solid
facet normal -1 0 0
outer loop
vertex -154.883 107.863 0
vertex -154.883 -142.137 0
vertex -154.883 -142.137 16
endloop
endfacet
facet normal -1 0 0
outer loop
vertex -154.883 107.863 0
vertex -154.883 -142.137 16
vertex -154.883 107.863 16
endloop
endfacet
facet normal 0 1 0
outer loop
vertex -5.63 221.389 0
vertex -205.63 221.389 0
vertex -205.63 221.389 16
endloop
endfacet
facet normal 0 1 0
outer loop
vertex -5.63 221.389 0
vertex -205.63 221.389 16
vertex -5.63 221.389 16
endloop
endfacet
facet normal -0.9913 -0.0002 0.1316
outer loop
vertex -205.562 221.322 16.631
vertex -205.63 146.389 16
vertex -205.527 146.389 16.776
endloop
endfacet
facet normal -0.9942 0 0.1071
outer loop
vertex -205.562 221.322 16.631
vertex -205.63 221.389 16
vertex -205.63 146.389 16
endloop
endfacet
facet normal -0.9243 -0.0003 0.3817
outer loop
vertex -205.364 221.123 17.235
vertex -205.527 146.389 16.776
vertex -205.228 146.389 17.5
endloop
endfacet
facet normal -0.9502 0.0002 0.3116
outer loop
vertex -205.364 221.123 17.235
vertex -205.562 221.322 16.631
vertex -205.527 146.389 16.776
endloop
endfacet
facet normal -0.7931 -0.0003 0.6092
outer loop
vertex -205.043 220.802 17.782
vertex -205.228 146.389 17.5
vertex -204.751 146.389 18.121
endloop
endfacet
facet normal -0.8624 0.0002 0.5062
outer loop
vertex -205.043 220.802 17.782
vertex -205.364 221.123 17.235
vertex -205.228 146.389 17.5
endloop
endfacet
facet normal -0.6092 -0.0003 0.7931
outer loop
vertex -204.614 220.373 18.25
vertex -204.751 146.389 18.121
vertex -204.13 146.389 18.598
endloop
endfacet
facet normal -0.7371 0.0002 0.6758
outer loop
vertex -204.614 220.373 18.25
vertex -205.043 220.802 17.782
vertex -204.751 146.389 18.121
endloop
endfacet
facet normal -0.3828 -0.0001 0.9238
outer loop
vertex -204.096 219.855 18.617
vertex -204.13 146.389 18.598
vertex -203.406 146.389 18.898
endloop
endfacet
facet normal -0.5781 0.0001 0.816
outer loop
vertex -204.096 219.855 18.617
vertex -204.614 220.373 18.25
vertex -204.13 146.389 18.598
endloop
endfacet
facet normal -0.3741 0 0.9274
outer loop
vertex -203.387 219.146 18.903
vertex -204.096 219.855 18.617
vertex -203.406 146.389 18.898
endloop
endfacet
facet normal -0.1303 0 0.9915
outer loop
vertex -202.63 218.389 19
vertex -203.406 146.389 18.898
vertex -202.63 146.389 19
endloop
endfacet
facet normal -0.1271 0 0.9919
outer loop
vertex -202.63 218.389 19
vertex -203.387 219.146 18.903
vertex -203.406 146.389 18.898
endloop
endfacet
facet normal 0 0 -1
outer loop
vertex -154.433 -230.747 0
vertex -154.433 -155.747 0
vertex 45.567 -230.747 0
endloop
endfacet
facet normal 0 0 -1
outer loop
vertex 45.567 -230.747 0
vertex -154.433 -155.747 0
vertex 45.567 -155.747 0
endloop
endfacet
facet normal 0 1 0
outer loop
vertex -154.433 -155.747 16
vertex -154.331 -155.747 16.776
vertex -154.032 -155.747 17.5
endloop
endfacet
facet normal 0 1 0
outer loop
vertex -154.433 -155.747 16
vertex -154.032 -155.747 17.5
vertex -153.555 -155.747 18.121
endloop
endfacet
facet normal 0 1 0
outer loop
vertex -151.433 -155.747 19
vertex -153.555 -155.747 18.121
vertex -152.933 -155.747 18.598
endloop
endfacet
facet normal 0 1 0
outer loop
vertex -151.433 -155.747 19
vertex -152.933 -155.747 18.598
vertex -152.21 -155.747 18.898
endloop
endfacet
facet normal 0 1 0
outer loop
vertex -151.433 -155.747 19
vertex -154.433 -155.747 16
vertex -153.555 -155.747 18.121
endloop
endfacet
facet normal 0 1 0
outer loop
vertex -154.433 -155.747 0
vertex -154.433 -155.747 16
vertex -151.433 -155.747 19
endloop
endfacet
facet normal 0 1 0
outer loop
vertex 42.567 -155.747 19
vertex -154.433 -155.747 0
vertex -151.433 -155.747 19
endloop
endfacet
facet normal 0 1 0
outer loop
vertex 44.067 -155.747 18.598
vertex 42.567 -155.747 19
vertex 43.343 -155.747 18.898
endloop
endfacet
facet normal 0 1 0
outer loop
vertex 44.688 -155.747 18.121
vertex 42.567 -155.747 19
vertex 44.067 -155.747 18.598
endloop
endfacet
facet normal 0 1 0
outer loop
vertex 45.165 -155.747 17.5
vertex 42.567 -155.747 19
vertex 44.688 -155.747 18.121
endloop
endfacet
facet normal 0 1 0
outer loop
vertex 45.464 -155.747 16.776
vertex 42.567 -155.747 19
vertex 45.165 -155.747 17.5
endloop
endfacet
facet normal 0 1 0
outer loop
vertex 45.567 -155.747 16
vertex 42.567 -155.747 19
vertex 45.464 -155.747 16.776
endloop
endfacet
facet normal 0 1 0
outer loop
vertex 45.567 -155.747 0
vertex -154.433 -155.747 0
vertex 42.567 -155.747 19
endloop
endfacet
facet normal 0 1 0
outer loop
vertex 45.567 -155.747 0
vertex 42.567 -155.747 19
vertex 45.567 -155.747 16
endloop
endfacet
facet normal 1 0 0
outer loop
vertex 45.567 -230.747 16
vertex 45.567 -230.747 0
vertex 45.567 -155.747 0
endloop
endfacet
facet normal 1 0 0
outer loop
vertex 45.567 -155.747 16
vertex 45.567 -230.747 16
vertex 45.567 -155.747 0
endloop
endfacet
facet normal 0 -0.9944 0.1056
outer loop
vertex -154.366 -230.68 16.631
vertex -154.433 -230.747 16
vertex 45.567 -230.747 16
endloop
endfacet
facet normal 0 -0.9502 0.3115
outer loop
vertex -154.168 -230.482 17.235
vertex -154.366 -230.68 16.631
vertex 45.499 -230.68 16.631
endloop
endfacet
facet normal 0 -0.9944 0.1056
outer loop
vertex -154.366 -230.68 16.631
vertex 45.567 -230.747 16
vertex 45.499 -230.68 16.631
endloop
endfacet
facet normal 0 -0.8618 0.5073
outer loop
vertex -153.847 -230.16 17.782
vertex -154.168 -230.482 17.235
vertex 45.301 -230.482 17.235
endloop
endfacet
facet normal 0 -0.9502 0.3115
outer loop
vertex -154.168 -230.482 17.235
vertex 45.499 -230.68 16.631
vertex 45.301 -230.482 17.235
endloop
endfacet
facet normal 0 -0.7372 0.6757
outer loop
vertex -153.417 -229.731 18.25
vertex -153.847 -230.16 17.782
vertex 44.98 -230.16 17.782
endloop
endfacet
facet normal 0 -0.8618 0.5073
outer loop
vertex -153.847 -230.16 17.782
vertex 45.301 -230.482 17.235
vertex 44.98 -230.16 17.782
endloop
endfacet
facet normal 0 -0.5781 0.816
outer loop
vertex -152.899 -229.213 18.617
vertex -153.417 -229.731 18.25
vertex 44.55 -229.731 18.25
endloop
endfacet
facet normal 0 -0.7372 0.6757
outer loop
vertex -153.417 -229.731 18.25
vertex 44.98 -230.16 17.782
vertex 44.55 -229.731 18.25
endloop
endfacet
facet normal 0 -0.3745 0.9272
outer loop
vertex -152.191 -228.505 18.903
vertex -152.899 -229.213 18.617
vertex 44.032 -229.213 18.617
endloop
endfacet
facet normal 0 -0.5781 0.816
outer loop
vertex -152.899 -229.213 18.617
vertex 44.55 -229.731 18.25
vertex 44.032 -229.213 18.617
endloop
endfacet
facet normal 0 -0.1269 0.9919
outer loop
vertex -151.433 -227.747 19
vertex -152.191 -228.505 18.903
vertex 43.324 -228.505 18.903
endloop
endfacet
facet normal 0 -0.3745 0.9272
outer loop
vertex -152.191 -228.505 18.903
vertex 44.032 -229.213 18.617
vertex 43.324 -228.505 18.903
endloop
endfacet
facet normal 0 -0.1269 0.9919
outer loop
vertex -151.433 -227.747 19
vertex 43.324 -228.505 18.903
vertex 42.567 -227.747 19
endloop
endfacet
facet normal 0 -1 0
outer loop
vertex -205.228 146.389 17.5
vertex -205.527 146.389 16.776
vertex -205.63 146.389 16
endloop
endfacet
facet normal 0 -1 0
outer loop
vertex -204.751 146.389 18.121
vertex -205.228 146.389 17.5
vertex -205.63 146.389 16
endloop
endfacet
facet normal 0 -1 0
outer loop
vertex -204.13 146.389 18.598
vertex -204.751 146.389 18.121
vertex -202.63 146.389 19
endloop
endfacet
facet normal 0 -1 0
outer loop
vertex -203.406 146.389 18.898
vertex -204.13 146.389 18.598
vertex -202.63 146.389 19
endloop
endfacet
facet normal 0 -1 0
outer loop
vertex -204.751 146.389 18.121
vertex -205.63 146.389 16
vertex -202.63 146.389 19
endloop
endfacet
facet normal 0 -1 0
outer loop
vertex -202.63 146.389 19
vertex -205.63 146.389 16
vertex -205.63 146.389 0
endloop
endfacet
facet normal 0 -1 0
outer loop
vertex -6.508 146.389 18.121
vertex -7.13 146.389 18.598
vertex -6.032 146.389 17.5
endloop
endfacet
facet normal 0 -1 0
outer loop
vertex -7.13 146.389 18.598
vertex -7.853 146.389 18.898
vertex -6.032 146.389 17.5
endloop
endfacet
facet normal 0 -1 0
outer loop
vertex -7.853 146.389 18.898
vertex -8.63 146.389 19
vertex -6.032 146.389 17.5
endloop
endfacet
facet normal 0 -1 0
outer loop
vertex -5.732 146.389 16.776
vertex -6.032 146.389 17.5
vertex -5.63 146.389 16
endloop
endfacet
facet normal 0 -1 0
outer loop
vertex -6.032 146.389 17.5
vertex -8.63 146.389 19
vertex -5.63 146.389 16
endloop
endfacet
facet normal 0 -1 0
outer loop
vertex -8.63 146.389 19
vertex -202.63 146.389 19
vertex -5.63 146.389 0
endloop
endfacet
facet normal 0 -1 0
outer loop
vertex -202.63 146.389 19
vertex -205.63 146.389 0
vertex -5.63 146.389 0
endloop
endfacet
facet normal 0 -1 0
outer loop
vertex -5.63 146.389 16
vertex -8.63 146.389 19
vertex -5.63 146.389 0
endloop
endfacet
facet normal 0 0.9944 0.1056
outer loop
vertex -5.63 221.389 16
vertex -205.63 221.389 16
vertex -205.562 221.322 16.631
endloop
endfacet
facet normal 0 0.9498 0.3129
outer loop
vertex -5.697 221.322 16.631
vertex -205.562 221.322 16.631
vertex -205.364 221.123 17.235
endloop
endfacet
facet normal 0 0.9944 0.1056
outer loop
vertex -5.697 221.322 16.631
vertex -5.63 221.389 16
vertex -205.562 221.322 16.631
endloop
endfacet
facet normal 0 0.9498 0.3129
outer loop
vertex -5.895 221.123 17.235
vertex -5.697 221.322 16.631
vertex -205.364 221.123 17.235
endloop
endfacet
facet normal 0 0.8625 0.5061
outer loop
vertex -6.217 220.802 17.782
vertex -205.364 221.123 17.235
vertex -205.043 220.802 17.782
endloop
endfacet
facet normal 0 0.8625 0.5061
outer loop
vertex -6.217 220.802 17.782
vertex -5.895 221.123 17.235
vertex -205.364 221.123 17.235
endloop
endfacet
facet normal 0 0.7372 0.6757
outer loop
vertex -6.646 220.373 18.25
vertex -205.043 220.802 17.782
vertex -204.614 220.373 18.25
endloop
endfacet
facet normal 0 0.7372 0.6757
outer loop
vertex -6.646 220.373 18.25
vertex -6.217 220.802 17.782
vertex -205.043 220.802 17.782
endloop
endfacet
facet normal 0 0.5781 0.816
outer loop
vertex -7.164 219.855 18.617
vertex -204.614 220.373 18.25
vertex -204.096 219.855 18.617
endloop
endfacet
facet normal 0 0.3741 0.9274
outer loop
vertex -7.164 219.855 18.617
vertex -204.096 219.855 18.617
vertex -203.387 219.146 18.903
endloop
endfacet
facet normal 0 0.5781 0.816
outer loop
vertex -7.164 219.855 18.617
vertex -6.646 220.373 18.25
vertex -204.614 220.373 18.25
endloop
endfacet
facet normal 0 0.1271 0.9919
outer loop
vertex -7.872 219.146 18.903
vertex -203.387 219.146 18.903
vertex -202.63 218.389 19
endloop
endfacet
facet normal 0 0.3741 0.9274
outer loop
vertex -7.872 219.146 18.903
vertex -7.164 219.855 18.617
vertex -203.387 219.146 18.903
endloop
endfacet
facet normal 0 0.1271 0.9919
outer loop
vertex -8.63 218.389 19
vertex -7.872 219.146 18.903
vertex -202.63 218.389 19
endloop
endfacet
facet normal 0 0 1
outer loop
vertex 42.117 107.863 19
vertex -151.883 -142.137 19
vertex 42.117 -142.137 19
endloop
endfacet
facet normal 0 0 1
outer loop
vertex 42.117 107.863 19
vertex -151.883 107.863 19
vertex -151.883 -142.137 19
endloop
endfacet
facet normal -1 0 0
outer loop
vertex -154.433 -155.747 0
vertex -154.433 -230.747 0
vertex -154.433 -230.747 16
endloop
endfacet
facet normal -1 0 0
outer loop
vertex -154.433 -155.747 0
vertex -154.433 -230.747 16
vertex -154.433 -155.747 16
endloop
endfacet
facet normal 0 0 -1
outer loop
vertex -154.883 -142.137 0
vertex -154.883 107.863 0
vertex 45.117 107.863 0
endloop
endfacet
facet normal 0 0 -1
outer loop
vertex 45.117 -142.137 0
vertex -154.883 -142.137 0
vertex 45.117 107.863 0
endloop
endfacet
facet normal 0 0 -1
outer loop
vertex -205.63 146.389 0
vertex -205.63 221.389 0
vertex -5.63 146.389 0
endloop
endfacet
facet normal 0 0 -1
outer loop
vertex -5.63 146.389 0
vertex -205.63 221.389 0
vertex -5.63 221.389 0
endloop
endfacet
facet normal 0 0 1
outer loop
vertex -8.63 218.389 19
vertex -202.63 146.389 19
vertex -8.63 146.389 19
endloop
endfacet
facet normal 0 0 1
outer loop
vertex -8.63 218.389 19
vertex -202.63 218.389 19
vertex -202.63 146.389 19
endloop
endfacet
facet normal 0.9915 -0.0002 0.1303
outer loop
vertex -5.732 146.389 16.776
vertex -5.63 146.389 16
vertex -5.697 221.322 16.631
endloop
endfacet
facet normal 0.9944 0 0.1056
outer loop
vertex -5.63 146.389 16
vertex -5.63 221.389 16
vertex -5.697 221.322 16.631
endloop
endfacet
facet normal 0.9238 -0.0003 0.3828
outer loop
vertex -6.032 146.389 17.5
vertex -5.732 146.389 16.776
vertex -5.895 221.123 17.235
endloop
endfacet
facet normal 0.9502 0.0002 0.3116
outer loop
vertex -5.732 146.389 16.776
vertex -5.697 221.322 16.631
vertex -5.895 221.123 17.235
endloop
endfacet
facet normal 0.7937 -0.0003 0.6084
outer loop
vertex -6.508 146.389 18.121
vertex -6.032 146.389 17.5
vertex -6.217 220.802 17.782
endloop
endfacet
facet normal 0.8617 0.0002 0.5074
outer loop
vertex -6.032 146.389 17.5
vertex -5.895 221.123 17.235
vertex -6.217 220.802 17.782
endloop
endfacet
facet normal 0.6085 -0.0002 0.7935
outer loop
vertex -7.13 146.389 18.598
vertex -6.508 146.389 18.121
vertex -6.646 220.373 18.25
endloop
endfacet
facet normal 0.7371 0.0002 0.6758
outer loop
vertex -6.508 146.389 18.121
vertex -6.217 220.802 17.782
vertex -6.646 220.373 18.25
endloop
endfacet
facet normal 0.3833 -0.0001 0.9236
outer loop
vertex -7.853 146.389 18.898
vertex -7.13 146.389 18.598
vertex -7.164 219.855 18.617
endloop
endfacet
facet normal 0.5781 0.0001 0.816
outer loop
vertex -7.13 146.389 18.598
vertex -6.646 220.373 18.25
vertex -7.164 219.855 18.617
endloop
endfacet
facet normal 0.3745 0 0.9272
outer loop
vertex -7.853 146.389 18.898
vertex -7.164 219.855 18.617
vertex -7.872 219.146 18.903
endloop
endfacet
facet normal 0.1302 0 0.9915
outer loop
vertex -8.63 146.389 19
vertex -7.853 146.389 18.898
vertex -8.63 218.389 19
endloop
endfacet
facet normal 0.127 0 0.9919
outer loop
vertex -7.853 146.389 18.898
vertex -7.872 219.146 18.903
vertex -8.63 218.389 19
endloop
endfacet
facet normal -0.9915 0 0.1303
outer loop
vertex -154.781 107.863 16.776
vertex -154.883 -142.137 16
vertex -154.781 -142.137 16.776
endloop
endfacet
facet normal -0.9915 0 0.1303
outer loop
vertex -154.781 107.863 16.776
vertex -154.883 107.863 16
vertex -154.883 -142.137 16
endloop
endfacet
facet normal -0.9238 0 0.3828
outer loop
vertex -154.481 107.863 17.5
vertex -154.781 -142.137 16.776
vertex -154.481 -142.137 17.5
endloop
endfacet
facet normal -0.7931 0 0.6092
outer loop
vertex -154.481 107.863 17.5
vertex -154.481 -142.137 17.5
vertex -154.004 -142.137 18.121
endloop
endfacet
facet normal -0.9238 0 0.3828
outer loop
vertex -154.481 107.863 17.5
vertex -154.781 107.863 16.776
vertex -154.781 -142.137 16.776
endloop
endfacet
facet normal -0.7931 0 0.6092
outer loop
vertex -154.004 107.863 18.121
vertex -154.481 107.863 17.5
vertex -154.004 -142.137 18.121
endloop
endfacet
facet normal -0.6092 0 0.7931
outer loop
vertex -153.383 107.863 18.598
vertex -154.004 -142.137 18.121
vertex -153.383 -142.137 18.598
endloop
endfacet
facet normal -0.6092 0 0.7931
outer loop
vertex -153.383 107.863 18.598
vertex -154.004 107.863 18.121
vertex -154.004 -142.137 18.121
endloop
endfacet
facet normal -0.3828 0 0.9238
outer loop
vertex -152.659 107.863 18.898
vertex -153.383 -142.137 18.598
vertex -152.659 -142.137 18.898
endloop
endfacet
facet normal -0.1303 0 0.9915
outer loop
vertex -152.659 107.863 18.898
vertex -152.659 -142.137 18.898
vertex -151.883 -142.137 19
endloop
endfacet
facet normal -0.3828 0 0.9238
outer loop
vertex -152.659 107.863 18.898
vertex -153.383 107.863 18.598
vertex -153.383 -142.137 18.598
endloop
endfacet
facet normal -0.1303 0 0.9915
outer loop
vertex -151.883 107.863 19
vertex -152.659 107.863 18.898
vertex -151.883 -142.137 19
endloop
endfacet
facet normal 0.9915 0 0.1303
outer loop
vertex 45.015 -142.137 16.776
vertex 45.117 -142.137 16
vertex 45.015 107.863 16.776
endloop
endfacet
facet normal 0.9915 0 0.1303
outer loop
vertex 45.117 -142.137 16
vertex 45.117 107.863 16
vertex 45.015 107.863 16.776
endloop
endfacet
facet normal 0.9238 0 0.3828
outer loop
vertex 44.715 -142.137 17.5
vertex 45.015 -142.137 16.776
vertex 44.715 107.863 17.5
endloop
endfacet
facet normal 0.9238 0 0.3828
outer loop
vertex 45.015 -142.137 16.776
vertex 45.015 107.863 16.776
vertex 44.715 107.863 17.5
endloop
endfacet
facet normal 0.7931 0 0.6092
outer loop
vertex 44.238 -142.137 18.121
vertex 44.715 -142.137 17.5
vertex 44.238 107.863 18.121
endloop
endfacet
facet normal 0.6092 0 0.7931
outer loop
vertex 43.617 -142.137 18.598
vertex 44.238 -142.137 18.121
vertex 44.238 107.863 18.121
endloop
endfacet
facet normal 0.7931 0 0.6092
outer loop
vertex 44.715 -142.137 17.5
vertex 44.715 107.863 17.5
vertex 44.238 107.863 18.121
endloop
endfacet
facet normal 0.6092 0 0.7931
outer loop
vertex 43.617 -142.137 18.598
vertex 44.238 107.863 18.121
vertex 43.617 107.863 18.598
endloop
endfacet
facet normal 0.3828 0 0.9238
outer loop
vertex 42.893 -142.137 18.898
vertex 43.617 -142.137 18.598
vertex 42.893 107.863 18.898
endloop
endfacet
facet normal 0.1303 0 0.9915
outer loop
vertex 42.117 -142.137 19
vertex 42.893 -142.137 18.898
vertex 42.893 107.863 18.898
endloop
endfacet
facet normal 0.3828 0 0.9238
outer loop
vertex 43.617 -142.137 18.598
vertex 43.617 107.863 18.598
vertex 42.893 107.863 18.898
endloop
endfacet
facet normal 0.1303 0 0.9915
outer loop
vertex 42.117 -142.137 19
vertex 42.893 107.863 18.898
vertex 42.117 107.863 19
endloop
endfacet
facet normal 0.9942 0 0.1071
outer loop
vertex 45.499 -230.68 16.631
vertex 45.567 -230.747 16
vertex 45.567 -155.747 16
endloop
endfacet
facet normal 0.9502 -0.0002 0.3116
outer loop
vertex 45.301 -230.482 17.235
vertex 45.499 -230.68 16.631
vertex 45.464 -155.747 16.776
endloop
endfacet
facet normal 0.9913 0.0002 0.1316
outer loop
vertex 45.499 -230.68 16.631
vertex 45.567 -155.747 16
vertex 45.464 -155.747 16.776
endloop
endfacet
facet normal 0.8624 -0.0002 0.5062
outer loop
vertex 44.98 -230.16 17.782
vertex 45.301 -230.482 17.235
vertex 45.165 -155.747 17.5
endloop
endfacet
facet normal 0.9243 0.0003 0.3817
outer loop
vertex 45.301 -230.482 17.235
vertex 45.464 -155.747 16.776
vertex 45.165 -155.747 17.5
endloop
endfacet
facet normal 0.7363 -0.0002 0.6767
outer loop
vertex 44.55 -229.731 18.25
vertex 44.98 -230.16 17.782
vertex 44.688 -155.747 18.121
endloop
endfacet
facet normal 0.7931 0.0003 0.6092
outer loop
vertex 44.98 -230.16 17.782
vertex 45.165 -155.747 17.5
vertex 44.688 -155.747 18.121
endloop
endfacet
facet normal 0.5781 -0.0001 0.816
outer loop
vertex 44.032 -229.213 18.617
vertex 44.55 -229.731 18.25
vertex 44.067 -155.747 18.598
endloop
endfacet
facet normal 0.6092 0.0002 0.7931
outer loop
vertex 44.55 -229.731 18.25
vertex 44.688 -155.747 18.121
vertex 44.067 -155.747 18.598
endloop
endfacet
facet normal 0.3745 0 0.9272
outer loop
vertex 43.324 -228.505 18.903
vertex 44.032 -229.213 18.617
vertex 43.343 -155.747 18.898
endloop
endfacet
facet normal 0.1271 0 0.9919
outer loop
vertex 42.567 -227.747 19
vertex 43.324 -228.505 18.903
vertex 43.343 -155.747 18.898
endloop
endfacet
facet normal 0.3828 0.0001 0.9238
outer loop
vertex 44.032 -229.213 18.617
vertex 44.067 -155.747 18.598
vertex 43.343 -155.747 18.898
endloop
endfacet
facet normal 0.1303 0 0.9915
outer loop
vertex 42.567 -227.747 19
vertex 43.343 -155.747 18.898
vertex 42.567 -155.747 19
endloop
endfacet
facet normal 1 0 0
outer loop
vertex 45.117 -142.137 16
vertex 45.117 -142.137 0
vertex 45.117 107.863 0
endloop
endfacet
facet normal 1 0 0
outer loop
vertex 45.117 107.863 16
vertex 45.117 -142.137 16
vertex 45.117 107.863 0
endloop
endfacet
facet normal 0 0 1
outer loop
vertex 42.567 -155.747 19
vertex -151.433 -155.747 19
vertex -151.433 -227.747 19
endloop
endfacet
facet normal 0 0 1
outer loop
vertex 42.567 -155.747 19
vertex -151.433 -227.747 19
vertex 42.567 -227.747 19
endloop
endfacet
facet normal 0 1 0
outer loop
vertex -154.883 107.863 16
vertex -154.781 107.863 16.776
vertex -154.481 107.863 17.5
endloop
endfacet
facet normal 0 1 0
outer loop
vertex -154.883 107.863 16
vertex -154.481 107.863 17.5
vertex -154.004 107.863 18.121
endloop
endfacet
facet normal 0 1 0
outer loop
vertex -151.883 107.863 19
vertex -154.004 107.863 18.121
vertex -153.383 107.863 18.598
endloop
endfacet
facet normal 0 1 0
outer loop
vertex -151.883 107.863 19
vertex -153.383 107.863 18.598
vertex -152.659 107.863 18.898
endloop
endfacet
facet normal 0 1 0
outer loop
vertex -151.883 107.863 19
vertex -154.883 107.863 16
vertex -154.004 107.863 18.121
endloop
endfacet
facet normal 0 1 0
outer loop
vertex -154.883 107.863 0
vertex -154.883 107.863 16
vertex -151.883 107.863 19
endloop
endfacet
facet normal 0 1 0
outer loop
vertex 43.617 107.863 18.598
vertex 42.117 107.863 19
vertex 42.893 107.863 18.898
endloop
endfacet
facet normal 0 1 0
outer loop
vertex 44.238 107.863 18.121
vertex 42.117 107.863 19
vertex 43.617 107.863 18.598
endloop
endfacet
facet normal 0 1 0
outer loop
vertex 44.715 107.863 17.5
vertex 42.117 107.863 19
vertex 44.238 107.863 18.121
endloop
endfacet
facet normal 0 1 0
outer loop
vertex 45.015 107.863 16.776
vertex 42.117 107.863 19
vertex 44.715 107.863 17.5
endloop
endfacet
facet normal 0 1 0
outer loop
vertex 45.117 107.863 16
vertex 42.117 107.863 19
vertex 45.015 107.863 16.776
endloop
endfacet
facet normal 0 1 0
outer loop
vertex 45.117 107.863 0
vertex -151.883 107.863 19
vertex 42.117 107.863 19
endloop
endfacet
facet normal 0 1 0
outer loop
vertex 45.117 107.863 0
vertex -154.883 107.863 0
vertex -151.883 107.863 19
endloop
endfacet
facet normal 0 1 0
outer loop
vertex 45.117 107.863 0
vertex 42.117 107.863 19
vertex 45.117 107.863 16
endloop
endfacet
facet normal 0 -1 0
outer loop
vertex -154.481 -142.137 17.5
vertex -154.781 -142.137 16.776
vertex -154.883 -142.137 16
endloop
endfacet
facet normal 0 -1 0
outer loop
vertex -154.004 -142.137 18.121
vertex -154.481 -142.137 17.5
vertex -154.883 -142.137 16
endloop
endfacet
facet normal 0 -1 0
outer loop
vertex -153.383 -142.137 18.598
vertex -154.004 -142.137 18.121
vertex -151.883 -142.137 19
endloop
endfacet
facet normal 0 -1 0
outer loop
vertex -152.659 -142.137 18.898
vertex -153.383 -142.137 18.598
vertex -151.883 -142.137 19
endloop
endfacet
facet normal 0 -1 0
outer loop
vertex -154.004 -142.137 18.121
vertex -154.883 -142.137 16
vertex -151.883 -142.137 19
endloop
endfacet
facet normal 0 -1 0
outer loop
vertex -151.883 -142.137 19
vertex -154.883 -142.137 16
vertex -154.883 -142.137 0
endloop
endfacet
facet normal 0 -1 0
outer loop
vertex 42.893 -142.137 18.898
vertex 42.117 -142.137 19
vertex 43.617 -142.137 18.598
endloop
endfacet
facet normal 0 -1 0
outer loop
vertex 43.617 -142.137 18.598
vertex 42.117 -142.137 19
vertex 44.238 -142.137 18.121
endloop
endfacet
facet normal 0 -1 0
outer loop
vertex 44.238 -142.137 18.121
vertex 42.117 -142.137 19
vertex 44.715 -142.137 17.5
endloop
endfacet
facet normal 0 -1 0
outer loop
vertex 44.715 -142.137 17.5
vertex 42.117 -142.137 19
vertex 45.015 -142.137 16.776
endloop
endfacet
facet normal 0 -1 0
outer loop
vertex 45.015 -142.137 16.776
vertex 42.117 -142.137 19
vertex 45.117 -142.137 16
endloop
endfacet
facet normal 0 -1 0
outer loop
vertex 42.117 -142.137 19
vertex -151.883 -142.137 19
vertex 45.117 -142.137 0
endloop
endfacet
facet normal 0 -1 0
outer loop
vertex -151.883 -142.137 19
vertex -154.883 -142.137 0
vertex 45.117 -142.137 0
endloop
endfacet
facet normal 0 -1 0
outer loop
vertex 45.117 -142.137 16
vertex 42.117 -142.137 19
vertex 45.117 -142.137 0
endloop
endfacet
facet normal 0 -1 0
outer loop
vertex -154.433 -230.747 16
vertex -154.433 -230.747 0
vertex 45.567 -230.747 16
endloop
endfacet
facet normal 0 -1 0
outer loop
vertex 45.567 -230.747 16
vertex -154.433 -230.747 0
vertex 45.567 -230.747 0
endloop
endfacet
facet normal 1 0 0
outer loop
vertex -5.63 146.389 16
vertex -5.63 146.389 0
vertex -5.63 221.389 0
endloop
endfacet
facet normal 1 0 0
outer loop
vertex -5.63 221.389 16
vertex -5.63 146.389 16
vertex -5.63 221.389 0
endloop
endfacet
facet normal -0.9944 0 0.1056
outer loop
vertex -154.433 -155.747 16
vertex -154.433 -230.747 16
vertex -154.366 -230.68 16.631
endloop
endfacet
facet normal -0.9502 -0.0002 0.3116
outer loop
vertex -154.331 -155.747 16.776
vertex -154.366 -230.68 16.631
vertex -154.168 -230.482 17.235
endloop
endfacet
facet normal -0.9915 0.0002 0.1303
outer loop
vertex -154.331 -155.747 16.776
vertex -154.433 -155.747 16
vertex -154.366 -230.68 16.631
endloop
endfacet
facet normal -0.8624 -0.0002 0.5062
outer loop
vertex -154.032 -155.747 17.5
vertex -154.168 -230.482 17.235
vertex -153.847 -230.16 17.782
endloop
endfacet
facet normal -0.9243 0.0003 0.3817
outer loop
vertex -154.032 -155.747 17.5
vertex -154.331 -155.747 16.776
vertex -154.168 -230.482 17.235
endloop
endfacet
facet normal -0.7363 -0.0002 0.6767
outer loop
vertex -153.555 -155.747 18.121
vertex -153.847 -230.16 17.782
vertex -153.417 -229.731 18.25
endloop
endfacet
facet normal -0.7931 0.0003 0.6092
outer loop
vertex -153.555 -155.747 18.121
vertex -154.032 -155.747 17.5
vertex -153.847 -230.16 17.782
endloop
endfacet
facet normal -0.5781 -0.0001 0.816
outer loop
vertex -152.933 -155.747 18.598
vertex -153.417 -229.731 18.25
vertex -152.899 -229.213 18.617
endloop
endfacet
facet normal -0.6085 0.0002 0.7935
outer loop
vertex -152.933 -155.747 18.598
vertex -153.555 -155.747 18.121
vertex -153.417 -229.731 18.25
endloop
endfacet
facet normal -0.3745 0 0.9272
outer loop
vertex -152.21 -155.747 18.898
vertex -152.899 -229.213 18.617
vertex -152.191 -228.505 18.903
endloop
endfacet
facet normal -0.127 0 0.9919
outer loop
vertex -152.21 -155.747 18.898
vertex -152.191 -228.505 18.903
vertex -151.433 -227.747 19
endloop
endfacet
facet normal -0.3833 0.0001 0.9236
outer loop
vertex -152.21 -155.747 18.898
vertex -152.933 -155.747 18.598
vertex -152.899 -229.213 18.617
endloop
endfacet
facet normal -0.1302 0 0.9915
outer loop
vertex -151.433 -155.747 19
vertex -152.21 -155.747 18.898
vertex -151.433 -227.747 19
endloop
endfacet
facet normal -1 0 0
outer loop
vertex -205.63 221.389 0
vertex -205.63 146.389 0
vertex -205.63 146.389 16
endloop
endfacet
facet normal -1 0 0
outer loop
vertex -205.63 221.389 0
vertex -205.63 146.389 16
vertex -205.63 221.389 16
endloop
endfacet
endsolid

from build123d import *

# Parameters (mm, degrees)
F0_W     = 200
F0_H     = 250
F3_DEPTH = 19
F1_W     = 200
F1_H     = 75
F4_DEPTH = 19
F2_W     = 200
F2_H     = 75
F5_DEPTH = 19
F6_R     = 3
F6_2_R   = 3
F6_3_R   = 3


with BuildPart() as f3:
    # F0 (on Top) → F3 (new body)
    with BuildSketch(Plane.XY):
        with Locations((-54.883, -17.136587)):
            Rectangle(F0_W, F0_H)
    extrude(amount=F3_DEPTH)

    # F6#2
    f6_2_edges = [f3.edges().sort_by_distance(p)[0] for p in [
        (45.117, -17.136587, 19),
        (-154.883, -17.136587, 19),
    ]]
    fillet(f6_2_edges, radius=F6_2_R)


with BuildPart() as f4:
    # F1 (on Top) → F4 (new body)
    with BuildSketch(Plane.XY):
        with Locations((-54.433488, -193.247341)):
            Rectangle(F1_W, F1_H)
    extrude(amount=F4_DEPTH)

    # F6#3
    f6_3_edges = [f4.edges().sort_by_distance(p)[0] for p in [
        (-154.433488, -193.247341, 19),
        (-54.433488, -230.747341, 19),
        (45.566512, -193.247341, 19),
    ]]
    fillet(f6_3_edges, radius=F6_3_R)


with BuildPart() as f5:
    # F2 (on Top) → F5 (new body)
    with BuildSketch(Plane.XY):
        with Locations((-105.629673, 183.888775)):
            Rectangle(F2_W, F2_H)
    extrude(amount=F5_DEPTH)

    # F6
    f6_edges = [f5.edges().sort_by_distance(p)[0] for p in [
        (-205.629673, 183.888775, 19),
        (-105.629673, 221.388775, 19),
        (-5.629673, 183.888775, 19),
    ]]
    fillet(f6_edges, radius=F6_R)


solid = Compound([f3.part, f4.part, f5.part])
